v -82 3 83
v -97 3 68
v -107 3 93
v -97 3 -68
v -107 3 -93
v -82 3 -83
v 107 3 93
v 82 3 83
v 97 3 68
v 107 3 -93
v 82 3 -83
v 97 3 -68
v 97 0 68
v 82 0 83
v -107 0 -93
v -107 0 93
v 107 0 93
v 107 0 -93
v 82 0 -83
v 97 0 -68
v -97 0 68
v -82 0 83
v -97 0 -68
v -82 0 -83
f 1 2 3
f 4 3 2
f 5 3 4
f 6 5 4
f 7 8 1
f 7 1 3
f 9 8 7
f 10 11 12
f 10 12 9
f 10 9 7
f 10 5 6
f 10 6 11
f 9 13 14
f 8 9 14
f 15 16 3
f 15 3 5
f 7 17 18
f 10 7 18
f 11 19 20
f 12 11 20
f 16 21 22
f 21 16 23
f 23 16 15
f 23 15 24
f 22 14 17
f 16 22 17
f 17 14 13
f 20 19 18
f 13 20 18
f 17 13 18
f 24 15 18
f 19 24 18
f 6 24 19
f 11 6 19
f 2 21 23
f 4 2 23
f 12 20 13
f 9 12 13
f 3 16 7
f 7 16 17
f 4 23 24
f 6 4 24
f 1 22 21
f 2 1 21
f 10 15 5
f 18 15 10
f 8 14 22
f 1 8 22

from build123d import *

# Parameters (mm, degrees)
SKETCH1_W           = 214
SKETCH1_H           = 186
BOSS_EXTRUDE1_DEPTH = 3


with BuildPart() as part:
    # Sketch1 → Boss-Extrude1 (new body)
    with BuildSketch(Plane(origin=(0, 0, 0), x_dir=(1, 0, 0), z_dir=(0, 1, 0))):
        Rectangle(SKETCH1_W, SKETCH1_H)
        Polygon((-82, 83), (82, 83), (97, 68), (97, -68), (82, -83), (-82, -83), (-97, -68), (-97, 68), align=None, mode=Mode.SUBTRACT)
    extrude(amount=BOSS_EXTRUDE1_DEPTH)


solid = part.part
